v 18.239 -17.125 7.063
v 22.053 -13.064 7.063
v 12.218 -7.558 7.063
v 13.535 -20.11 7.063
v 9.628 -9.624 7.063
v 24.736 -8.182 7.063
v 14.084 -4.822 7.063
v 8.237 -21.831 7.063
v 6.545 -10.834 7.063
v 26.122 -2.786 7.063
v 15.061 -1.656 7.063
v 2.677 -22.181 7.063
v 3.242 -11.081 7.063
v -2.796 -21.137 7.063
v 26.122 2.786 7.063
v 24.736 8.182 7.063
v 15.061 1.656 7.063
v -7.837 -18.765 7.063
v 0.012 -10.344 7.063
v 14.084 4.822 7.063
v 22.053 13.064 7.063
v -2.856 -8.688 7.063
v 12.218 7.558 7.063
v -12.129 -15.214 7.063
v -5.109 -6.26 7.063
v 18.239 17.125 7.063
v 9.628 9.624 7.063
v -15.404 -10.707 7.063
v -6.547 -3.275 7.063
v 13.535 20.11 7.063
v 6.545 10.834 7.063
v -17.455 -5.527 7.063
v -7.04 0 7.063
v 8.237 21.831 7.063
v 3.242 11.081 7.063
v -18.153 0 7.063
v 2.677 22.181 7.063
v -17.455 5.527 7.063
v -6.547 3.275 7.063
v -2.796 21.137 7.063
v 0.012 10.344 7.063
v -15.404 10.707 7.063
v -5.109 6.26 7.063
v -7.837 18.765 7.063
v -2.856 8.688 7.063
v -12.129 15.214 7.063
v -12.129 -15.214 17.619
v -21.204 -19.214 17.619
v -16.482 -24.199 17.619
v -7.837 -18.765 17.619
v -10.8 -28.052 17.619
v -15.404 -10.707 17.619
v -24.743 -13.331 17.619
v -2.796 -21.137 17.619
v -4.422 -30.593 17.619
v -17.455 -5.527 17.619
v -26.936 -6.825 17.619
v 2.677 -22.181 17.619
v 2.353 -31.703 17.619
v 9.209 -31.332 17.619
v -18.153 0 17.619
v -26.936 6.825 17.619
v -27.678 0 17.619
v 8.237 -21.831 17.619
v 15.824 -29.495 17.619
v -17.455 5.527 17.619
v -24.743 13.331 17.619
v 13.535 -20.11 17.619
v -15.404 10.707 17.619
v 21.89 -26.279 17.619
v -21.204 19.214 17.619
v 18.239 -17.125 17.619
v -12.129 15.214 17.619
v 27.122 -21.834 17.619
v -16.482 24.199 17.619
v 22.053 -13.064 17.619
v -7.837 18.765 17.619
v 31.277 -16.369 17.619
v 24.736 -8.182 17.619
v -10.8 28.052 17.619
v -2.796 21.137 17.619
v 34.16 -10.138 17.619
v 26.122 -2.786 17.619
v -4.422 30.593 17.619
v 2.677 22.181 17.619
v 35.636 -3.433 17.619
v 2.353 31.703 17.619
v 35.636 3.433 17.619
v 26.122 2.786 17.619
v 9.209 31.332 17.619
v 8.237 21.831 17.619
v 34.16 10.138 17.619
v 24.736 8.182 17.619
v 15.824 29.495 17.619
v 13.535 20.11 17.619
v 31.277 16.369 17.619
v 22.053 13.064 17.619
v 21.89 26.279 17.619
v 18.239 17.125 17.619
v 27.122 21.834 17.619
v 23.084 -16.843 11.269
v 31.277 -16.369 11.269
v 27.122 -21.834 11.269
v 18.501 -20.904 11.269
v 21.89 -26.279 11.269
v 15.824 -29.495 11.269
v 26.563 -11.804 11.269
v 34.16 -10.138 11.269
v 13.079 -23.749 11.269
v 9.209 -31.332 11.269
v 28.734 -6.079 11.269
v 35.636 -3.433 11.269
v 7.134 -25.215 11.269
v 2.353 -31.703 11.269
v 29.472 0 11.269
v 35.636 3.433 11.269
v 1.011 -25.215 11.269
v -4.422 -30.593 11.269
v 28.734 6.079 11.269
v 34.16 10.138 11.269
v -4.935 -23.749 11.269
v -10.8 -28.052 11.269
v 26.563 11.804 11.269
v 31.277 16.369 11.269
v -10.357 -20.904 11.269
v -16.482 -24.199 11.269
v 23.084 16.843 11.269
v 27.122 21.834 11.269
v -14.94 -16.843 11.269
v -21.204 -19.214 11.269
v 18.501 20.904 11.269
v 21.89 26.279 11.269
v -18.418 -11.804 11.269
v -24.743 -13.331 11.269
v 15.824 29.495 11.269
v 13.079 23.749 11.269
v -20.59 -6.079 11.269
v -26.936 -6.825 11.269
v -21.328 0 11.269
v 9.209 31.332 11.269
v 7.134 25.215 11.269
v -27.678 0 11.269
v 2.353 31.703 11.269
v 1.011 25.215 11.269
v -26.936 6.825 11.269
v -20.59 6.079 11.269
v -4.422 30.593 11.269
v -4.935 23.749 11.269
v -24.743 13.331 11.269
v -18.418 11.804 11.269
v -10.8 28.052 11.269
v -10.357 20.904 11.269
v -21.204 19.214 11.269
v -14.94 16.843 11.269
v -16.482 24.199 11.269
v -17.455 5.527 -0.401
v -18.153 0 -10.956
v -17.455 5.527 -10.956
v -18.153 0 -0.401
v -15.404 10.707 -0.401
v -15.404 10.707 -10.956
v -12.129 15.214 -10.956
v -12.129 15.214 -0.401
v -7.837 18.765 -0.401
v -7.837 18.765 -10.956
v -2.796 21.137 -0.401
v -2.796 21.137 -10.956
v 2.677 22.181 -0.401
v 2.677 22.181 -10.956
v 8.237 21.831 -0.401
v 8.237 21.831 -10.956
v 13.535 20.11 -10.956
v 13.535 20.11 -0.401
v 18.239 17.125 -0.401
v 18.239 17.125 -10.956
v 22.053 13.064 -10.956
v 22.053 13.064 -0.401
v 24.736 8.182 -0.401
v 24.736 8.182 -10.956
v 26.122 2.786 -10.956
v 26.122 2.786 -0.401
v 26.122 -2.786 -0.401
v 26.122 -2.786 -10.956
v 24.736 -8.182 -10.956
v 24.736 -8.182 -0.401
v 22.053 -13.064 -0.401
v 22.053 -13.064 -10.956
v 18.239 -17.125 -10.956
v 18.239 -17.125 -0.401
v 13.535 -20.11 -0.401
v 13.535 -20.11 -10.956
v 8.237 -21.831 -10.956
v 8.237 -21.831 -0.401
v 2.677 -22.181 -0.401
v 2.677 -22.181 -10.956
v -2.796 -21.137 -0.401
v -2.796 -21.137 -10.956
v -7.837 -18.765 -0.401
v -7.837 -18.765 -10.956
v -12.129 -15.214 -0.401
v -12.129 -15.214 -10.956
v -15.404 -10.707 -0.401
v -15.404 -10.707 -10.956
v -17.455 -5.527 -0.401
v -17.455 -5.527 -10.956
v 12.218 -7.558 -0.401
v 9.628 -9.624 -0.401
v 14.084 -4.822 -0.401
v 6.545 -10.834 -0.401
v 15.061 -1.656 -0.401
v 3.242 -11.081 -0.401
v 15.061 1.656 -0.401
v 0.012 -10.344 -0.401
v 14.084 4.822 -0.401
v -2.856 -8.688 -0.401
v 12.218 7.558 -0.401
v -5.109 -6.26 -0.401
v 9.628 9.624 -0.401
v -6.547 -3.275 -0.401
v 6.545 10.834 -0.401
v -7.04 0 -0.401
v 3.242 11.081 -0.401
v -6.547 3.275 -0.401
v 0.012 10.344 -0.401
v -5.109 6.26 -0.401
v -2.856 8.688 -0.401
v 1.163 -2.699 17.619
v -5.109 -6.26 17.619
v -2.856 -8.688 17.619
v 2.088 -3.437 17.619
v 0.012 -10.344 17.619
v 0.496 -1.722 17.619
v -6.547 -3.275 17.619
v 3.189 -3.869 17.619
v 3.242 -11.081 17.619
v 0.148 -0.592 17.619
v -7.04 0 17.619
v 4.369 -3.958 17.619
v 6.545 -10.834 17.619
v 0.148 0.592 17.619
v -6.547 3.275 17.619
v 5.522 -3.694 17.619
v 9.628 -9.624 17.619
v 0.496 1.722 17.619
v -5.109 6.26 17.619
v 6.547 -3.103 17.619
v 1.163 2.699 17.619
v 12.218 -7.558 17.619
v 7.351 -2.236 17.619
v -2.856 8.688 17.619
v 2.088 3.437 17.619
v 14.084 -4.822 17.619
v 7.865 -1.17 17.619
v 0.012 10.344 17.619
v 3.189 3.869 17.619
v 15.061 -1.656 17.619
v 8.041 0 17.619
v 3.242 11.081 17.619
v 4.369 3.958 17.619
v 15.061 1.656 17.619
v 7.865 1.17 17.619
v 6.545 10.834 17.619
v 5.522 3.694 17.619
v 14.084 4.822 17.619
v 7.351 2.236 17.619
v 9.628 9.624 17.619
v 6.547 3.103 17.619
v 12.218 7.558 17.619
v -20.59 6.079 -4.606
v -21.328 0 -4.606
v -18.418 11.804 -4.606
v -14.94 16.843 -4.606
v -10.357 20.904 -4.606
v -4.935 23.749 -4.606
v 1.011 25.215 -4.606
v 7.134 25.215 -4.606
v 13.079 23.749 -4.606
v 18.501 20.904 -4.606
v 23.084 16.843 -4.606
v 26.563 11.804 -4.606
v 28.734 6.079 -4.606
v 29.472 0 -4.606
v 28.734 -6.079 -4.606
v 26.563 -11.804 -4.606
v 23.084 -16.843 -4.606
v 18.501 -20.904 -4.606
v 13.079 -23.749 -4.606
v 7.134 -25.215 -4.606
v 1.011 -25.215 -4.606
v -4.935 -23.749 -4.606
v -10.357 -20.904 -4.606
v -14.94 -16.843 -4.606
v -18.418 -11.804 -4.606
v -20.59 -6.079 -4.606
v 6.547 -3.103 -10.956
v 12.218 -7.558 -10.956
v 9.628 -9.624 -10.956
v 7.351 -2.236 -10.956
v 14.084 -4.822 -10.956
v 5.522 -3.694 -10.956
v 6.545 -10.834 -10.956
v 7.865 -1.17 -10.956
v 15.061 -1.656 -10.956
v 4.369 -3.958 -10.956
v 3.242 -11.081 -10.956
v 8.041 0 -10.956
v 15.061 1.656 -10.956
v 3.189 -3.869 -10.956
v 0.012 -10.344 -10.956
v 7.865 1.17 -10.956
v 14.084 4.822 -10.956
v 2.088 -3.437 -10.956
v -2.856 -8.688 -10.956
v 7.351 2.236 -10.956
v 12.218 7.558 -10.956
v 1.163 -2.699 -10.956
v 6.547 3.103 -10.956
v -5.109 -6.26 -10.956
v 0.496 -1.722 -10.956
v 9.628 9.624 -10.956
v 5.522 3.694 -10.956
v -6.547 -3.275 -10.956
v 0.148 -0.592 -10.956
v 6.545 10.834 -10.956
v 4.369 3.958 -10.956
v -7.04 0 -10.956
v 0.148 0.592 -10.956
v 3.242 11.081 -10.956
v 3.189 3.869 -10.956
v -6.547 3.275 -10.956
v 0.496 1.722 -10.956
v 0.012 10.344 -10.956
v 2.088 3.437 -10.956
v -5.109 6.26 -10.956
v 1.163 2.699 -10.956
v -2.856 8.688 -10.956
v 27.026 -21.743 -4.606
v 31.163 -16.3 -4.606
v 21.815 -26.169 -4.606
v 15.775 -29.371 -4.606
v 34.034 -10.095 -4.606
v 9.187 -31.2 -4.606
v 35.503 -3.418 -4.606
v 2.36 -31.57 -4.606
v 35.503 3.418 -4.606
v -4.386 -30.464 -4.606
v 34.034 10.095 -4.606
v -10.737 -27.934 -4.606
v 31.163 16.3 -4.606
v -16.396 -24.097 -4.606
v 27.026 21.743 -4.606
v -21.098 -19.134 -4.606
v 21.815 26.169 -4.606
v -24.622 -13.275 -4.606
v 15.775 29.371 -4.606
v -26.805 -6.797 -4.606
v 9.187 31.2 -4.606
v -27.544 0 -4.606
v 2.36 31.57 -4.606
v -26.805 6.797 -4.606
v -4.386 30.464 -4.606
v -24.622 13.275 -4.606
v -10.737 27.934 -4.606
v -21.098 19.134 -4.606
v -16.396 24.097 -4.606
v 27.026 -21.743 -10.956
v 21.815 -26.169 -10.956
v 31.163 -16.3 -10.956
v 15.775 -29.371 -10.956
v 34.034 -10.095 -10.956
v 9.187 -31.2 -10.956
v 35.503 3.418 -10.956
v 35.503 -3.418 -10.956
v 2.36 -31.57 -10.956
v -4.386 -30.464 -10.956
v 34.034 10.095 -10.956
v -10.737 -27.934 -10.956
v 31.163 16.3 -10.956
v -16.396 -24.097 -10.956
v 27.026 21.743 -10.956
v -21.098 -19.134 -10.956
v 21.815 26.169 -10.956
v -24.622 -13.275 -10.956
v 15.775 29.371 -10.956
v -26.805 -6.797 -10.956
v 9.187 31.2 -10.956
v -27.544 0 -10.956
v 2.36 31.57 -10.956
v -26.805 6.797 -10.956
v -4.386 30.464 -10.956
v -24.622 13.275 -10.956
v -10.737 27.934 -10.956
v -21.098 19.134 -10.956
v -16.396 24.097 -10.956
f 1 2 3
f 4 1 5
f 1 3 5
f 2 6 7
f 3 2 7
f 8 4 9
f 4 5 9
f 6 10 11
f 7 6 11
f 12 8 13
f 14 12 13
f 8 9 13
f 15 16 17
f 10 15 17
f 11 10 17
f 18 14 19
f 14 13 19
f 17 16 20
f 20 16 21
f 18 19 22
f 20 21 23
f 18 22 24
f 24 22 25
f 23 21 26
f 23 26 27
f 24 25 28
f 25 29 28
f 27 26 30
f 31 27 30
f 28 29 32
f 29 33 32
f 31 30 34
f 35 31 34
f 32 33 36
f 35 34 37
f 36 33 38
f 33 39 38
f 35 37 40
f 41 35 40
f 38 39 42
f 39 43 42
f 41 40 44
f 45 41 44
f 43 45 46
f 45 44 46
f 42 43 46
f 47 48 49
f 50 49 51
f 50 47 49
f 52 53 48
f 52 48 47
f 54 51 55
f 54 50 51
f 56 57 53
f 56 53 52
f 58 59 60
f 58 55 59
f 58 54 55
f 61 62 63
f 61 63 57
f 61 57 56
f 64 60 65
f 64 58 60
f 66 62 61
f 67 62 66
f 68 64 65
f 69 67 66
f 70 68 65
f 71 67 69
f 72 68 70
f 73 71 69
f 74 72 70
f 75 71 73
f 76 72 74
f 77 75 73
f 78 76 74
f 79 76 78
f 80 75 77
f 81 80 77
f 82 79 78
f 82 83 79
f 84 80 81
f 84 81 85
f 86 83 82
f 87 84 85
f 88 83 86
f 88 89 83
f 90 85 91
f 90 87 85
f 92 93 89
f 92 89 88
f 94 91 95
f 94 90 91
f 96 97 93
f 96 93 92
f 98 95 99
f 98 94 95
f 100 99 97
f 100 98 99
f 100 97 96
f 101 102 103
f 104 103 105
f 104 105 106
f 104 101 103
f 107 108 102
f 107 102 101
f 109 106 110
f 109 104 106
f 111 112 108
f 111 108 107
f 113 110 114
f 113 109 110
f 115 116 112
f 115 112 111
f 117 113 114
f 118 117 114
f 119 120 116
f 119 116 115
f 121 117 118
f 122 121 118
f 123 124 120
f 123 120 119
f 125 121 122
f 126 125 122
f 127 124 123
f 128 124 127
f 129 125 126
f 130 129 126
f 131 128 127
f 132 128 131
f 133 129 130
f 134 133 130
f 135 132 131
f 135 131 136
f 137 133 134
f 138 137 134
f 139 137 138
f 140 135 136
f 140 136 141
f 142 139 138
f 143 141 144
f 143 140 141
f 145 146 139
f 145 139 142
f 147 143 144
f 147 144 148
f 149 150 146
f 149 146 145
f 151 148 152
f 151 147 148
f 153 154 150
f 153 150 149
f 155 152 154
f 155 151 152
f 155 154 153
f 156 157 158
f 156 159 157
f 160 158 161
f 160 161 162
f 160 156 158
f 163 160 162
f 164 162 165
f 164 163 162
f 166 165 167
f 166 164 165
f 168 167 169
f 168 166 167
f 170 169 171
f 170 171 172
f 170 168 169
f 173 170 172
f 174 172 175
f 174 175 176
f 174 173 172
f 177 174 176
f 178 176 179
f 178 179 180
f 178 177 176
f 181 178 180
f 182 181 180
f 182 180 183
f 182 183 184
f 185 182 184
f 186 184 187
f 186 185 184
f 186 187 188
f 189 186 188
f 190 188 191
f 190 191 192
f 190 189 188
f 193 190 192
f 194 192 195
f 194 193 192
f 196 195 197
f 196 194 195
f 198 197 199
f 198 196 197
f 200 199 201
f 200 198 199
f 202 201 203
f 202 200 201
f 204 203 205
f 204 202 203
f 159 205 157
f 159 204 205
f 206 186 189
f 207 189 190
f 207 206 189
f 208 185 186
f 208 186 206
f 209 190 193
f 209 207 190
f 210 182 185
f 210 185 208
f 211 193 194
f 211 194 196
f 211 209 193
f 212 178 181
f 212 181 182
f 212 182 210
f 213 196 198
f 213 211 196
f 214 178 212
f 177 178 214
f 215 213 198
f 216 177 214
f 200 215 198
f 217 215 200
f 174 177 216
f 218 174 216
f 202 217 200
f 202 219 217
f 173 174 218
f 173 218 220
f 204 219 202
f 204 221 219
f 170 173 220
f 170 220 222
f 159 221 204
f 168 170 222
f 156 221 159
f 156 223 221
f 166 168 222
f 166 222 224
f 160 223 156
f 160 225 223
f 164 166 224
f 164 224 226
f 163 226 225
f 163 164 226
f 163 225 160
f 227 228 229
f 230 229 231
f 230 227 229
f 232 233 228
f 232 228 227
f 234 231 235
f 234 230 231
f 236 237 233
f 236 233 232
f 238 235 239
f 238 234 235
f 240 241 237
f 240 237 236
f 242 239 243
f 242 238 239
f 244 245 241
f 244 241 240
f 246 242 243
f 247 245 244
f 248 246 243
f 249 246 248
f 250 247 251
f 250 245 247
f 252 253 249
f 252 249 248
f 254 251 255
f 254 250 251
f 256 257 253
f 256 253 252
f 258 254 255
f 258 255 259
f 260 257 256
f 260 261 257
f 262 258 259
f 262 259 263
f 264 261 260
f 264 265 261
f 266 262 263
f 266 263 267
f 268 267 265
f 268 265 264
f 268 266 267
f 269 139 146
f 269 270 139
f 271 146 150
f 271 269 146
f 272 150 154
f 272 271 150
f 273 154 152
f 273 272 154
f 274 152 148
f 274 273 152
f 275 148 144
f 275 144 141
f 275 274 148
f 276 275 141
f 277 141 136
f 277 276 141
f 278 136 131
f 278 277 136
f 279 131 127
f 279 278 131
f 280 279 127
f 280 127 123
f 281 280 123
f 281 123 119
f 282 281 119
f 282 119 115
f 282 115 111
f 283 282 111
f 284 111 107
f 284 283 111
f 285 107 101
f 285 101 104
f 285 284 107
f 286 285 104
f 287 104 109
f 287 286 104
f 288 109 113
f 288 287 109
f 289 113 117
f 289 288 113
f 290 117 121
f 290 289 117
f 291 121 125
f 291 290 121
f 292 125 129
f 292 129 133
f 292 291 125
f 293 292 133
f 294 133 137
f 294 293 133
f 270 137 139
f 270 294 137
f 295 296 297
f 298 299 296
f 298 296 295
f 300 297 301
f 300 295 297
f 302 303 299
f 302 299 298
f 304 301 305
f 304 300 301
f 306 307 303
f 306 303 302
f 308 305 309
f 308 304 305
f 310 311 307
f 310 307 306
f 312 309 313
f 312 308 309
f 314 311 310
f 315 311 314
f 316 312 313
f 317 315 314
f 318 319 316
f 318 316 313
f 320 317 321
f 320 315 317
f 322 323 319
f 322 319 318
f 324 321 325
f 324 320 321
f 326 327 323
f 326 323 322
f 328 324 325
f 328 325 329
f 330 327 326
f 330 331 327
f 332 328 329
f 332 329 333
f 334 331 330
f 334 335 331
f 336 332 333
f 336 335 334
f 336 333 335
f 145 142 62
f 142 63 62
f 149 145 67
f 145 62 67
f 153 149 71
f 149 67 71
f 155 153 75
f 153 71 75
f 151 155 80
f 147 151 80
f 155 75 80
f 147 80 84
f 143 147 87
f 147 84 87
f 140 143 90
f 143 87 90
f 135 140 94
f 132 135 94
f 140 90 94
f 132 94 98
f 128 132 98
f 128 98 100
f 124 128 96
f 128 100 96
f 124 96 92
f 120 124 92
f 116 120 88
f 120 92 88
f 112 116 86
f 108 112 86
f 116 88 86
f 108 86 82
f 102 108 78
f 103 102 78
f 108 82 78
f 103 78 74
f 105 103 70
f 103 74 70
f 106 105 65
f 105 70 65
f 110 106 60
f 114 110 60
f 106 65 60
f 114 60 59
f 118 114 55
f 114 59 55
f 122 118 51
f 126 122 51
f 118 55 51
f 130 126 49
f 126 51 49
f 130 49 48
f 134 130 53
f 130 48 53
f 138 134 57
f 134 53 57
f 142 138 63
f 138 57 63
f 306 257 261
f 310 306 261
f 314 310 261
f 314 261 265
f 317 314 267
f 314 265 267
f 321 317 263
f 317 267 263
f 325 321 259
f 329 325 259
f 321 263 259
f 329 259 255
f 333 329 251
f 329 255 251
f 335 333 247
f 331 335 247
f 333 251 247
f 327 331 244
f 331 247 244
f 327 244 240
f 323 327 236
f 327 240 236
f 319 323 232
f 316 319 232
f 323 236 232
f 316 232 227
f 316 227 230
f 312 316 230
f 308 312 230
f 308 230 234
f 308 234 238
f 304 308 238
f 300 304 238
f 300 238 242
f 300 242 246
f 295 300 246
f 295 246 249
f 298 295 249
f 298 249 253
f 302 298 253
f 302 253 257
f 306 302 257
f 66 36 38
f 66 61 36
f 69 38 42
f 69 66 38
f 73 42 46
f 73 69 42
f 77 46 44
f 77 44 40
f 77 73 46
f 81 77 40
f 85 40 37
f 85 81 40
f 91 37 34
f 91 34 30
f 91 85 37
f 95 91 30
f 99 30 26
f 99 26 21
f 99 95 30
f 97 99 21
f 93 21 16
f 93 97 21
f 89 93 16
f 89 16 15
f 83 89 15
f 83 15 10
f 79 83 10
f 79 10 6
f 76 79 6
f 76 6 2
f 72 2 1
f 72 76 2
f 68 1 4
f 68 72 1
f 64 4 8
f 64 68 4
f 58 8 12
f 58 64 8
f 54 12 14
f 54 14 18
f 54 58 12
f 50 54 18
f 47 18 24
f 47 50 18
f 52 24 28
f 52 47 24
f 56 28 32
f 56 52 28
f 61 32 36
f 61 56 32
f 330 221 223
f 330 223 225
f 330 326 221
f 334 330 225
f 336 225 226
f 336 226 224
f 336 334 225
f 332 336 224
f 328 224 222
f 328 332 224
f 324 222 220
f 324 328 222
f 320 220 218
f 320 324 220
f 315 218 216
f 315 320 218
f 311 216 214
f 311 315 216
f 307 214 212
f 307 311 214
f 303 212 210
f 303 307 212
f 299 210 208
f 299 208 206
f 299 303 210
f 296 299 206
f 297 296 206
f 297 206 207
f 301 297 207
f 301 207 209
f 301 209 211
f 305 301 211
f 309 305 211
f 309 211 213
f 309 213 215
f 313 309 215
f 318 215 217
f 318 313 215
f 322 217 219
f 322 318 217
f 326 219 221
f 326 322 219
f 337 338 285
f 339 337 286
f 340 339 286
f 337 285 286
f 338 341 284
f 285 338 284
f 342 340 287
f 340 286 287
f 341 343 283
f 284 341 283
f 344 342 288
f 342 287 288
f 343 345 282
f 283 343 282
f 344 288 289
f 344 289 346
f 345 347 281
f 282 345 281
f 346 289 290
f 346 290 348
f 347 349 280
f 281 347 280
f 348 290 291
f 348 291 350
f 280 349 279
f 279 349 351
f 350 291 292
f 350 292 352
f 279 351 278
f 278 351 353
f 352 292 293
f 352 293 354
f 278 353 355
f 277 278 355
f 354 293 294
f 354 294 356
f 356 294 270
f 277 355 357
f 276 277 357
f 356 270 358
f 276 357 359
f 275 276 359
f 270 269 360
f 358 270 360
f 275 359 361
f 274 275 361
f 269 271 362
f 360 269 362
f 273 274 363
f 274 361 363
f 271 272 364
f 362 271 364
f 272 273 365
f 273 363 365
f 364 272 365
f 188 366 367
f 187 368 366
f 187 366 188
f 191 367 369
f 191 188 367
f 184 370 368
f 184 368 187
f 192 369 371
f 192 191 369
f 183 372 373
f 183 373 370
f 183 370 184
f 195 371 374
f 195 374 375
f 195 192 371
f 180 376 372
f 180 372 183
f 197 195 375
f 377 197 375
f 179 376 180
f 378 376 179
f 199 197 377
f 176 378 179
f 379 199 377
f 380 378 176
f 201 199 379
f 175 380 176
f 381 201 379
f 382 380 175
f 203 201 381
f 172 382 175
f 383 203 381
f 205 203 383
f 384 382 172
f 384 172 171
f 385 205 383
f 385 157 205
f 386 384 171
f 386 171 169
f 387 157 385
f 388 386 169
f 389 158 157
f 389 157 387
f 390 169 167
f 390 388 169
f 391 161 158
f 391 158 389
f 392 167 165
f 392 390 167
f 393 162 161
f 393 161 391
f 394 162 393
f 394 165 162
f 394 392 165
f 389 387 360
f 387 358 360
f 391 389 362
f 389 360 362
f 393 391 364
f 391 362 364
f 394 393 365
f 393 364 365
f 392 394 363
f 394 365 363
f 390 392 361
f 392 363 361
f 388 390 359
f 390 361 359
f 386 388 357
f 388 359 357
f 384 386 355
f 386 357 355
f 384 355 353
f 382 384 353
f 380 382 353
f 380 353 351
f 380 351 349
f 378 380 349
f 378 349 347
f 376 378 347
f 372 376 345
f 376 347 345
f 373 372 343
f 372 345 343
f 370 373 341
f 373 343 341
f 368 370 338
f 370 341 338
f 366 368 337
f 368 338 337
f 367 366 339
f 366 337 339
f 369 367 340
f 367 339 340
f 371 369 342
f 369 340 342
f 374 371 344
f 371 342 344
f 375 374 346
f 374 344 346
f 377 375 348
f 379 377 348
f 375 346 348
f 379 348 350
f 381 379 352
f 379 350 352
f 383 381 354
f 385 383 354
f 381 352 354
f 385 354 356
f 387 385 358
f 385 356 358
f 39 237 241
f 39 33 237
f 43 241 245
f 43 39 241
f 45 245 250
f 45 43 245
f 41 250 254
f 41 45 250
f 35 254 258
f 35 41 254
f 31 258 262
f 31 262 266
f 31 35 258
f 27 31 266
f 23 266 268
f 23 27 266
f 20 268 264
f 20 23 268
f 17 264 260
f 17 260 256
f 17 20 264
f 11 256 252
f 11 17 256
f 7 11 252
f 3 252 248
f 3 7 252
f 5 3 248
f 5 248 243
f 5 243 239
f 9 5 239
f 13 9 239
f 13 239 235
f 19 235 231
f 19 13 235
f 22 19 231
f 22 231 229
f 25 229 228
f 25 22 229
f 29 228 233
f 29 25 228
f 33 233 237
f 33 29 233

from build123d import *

# Parameters (mm, degrees)
F0_W     = 6.216531
F0_H     = 6.35
F0_W_2   = 6.35
F0_W_3   = 11.1125
F0_H_2   = 7.46389
F2_R     = 3.96875
F3_DEPTH = 28.576


with BuildPart() as f1:
    # F0 (on Front) → F1 (revolve)
    with BuildSketch(Plane.XZ):
        with Locations((-24.436133, -7.781217)):
            Rectangle(F0_W, F0_H)
        Polygon((-18.152868, 7.063228), (-18.152868, 17.618783), (-21.327868, 17.618783), (-21.327868, 11.268783), (-21.327868, -4.606217), (-21.327868, -10.956217), (-18.152868, -10.956217), (-18.152868, -0.400662), align=None)
        with Locations((-24.502868, 14.443783)):
            Rectangle(F0_W_2, F0_H)
        with Locations((-12.596618, 3.331283)):
            Rectangle(F0_W_3, F0_H_2)
        Polygon((-7.040368, 17.618783), (-7.040368, 7.063228), (-7.040368, -0.400662), (-7.040368, -10.956217), (4.072132, -10.956217), (4.072132, 17.618783), align=None)
    revolve(axis=Axis((4.072132, 0, 3.331283), (0, 0, -1)))

    # F2 (on face) → F3 (cut, through all)
    with BuildSketch(Plane.XY.offset(17.618783)):
        with Locations((4.072132, 0)):
            Circle(F2_R)
    extrude(amount=-F3_DEPTH, mode=Mode.SUBTRACT)


solid = f1.part
